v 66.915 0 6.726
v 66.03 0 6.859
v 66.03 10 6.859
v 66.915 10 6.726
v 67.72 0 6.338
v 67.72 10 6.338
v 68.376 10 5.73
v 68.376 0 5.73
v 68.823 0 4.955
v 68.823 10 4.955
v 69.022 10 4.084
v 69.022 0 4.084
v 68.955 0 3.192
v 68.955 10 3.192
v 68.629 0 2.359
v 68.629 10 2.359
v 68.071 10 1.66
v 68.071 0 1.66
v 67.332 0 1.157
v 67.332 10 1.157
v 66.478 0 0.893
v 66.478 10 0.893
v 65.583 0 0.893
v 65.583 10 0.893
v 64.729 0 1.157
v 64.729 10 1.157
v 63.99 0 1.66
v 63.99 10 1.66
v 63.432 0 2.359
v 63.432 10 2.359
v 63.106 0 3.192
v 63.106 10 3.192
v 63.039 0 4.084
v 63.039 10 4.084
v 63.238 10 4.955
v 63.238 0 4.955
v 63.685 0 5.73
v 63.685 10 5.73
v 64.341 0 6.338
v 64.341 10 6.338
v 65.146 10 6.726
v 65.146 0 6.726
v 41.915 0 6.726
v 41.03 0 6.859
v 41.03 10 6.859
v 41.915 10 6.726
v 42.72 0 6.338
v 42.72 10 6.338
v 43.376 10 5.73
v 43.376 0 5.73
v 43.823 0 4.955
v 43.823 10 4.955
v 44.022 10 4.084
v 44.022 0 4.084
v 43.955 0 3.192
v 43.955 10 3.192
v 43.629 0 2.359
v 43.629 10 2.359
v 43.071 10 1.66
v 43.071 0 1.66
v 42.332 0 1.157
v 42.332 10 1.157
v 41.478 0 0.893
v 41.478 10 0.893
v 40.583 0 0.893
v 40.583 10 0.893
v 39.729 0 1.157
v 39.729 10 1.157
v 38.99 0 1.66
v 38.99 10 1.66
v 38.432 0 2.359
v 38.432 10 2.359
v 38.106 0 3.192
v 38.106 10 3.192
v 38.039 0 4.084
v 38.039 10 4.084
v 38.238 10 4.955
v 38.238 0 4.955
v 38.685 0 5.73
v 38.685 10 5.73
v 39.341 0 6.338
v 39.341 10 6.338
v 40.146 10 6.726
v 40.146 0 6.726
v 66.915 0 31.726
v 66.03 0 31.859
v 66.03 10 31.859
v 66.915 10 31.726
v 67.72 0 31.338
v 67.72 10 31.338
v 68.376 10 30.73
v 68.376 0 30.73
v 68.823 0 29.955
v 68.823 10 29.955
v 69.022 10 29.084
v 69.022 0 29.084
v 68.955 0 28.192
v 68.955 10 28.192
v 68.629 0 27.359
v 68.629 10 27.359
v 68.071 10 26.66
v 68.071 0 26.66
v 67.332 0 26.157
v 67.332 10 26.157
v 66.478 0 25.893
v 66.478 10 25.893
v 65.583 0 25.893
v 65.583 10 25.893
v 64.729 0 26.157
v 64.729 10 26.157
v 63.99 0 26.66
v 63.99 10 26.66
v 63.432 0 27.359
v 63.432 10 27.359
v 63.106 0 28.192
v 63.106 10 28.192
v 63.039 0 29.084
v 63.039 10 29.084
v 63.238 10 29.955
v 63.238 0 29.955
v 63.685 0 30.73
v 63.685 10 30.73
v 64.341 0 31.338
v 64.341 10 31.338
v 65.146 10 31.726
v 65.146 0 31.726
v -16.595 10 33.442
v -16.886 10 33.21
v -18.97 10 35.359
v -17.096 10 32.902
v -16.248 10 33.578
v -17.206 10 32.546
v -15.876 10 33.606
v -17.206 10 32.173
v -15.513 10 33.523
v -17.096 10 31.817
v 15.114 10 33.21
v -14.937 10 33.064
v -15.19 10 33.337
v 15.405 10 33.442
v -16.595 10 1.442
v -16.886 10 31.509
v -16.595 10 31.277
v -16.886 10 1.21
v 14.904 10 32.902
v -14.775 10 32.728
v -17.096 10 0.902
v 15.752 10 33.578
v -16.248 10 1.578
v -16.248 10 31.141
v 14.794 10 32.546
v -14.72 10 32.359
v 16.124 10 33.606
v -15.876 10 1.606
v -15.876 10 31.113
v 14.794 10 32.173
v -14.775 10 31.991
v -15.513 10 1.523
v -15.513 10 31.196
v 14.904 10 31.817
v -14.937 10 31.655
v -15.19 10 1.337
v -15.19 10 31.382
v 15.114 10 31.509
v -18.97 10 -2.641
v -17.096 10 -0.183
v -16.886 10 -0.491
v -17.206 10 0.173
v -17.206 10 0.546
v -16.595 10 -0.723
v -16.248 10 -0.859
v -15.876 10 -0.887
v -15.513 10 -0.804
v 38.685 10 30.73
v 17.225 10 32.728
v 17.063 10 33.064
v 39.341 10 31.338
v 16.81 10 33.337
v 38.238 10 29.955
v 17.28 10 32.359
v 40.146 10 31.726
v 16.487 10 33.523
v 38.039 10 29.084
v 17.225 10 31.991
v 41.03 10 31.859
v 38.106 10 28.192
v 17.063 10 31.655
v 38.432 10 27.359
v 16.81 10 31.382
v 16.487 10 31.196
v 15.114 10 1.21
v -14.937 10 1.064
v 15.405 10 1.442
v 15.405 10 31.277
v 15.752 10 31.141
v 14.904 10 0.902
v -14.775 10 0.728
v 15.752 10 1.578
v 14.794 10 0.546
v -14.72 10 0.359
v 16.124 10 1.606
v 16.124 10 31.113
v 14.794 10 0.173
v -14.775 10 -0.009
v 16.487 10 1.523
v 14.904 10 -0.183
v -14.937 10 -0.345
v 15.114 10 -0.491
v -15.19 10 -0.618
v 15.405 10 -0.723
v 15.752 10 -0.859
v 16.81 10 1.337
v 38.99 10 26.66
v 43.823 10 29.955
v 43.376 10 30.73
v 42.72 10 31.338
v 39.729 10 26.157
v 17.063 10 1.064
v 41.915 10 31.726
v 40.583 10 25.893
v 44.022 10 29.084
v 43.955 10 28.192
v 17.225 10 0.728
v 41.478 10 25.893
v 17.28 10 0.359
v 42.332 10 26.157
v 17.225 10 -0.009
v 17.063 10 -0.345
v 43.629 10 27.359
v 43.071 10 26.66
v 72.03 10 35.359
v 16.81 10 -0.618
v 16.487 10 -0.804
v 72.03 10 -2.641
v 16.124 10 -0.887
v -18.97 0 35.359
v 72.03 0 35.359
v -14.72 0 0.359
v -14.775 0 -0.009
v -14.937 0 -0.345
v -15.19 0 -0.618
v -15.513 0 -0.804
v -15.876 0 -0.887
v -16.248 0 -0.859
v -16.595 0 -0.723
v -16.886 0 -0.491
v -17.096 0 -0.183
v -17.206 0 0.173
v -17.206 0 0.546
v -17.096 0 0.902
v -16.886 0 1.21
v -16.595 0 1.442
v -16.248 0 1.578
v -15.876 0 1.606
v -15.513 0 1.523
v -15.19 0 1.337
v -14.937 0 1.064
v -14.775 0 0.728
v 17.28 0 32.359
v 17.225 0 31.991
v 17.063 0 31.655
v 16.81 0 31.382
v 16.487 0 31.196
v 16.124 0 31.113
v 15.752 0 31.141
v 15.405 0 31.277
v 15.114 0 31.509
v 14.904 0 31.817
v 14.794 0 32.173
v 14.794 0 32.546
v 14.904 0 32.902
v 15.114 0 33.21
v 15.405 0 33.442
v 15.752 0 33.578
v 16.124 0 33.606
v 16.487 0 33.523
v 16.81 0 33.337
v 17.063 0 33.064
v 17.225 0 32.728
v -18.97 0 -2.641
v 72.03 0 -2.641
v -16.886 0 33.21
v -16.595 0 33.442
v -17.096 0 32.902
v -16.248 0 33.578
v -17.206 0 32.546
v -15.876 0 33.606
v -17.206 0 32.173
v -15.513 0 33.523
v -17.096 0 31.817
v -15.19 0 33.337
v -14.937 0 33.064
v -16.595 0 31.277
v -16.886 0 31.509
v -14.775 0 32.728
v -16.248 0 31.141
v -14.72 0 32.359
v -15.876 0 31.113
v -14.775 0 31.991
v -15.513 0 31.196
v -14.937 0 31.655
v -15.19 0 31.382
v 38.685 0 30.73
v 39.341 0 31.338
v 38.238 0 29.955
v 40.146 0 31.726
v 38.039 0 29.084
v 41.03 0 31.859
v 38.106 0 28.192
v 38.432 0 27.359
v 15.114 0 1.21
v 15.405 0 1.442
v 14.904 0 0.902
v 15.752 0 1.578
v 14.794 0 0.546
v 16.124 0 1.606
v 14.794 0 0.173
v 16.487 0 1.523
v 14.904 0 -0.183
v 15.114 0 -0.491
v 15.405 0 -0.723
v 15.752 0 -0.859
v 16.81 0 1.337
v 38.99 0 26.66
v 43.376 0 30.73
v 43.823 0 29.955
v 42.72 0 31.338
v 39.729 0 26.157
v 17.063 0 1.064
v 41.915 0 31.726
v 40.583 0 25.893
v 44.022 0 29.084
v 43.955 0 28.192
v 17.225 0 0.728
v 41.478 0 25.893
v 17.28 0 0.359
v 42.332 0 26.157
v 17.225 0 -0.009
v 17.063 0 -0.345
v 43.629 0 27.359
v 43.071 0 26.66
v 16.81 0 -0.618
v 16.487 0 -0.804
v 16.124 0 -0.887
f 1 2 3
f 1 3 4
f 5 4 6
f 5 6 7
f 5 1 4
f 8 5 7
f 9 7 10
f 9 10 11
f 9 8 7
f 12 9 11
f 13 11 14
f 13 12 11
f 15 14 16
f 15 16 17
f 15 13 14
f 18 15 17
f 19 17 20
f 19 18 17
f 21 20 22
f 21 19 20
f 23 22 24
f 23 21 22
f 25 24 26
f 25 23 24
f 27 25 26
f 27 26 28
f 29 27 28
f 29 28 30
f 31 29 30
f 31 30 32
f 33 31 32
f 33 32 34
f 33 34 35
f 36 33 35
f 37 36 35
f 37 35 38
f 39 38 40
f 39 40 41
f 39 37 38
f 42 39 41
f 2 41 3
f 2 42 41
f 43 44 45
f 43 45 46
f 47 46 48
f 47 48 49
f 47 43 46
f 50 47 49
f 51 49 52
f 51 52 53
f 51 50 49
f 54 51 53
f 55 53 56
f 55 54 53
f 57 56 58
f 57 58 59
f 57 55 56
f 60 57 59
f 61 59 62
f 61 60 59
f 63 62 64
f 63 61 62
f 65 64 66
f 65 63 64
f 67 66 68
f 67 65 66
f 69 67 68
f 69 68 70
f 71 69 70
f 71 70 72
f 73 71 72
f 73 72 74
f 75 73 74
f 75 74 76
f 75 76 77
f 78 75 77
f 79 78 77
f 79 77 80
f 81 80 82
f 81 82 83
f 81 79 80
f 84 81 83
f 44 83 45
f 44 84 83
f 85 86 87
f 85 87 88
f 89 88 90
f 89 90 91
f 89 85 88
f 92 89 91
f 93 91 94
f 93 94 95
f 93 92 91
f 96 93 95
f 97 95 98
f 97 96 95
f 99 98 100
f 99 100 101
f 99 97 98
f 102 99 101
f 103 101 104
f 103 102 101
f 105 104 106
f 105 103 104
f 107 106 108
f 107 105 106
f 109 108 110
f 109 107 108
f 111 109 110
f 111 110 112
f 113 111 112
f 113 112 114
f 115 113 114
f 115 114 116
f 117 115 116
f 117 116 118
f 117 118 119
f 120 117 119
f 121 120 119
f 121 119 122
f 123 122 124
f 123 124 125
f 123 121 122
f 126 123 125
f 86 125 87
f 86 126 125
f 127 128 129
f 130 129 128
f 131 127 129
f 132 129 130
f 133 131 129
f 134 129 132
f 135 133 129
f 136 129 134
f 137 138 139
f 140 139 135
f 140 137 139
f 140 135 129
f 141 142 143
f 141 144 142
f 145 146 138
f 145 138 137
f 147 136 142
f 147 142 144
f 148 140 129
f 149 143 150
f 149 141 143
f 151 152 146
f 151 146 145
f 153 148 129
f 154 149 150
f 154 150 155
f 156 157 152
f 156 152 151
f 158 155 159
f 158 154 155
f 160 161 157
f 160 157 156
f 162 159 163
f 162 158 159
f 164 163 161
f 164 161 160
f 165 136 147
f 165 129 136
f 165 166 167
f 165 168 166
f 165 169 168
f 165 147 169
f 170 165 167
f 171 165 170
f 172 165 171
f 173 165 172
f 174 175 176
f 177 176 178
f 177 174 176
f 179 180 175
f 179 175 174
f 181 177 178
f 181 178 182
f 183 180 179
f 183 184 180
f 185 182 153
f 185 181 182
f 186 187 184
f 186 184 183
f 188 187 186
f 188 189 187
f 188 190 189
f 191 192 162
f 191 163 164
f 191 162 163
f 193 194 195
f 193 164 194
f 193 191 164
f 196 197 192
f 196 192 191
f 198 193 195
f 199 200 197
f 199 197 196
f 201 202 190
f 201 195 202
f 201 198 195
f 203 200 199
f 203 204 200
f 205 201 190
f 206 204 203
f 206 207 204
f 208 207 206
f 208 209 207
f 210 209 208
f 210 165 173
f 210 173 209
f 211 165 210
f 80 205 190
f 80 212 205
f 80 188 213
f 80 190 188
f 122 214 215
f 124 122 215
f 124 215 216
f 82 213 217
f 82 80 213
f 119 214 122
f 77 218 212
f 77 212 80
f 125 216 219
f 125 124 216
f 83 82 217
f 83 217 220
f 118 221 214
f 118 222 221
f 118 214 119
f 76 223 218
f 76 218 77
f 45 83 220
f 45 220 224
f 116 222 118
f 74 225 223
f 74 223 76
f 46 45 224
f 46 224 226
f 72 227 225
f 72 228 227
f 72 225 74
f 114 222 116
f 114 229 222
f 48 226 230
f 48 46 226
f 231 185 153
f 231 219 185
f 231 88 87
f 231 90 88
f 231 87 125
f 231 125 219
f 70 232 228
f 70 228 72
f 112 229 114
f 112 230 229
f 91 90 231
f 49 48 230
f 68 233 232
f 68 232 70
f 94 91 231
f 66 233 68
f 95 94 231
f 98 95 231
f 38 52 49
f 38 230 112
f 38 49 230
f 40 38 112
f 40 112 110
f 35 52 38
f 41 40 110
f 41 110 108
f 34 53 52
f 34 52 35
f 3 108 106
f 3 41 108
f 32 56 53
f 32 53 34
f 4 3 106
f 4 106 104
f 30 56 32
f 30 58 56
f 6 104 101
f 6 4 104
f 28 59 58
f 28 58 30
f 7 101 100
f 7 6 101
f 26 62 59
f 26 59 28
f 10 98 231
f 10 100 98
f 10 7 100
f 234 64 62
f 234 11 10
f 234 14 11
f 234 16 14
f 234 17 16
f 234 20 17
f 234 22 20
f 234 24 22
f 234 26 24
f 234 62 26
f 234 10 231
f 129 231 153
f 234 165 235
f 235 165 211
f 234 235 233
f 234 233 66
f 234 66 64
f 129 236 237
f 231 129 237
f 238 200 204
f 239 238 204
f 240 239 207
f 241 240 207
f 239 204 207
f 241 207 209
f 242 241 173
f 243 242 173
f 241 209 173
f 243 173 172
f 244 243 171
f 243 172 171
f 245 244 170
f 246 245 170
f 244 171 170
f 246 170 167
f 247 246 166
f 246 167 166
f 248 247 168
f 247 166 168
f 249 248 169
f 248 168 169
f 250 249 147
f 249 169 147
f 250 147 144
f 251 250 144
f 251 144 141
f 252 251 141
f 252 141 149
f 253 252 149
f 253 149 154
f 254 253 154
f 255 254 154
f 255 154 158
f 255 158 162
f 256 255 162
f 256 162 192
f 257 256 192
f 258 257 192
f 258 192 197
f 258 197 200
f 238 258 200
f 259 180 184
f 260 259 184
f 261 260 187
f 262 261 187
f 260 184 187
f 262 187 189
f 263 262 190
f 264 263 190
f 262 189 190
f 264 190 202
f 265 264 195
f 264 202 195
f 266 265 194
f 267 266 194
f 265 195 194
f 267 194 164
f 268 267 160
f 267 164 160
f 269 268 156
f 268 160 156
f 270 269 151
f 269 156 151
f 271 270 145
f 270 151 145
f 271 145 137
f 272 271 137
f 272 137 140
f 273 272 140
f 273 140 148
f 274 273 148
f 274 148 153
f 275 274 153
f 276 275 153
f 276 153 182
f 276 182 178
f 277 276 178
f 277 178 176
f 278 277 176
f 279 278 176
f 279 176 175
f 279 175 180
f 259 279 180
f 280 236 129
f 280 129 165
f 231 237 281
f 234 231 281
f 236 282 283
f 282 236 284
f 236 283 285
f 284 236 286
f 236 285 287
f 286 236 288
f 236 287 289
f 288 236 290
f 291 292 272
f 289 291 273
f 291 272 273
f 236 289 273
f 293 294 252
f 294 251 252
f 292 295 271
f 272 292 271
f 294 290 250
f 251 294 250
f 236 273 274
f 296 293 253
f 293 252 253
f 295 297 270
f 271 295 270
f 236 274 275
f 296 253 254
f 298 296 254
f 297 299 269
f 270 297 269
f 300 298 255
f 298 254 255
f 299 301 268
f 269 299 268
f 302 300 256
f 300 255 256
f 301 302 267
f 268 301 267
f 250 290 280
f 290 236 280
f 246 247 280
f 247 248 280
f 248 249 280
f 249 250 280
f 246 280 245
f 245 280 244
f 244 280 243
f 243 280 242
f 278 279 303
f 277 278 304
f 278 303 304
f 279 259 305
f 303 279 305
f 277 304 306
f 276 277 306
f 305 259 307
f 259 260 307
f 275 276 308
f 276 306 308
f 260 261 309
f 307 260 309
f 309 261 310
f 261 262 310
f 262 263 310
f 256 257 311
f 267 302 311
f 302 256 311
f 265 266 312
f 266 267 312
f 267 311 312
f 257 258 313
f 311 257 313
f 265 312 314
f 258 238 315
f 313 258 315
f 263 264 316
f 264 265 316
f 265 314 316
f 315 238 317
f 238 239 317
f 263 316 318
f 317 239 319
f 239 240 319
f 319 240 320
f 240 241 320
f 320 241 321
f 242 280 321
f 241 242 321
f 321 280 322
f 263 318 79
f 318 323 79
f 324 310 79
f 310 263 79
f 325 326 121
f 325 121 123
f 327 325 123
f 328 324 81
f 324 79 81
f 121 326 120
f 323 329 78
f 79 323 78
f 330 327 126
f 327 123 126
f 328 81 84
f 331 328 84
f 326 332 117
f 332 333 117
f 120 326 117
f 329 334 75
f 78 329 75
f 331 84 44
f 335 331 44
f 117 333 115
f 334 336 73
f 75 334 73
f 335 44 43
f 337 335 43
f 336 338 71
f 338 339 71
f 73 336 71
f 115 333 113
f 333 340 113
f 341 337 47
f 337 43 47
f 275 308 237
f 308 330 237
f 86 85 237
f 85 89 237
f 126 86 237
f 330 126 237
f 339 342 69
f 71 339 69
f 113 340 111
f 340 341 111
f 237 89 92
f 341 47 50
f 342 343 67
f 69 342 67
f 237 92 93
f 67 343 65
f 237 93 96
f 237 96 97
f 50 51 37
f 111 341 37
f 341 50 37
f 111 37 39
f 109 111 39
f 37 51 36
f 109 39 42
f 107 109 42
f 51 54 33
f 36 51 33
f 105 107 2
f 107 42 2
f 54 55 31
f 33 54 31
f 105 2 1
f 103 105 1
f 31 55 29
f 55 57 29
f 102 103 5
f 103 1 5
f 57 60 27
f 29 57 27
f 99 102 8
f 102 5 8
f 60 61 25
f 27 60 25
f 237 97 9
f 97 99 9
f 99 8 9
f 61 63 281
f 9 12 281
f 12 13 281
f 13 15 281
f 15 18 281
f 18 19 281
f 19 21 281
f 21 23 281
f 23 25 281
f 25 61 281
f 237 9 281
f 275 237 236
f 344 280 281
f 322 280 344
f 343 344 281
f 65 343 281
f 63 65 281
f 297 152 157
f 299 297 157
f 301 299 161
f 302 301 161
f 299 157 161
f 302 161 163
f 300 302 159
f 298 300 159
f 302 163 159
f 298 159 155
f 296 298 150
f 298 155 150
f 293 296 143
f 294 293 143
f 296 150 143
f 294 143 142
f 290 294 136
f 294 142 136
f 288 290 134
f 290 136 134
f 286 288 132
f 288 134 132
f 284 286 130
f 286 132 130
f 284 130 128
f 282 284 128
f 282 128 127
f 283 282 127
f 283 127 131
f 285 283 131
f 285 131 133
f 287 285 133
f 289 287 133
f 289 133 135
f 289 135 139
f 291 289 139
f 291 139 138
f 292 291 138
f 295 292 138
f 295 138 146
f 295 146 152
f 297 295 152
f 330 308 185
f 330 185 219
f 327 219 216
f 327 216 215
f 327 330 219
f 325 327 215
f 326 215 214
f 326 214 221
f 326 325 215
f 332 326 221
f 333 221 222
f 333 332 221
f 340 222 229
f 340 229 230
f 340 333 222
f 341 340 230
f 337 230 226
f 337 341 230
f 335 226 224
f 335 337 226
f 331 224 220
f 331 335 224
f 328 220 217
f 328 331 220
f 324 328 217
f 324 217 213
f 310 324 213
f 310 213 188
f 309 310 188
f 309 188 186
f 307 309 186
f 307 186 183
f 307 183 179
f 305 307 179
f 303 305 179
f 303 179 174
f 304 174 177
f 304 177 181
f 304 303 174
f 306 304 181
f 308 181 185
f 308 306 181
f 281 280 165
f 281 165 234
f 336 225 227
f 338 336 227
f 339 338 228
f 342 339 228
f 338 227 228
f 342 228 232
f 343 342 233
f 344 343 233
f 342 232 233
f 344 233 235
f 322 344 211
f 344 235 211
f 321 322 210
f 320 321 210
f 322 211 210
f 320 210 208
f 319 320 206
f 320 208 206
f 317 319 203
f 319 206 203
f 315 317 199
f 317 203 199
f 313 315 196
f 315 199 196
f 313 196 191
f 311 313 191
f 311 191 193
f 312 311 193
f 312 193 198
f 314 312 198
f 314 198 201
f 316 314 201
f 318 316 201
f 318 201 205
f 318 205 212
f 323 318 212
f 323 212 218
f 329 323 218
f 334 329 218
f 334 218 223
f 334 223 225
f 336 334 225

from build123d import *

# Parameters (mm, degrees)
SKETCH1_W             = 91
SKETCH1_H             = 38
SKETCH1_R             = 3
BOSS_EXTRUDE1_DEPTH   = 10
M3X0_5_TAPPED_HOLE1_D = 2.5


with BuildPart() as part:
    # Sketch1 → Boss-Extrude1 (new body)
    with BuildSketch(Plane(origin=(0, 0, 0), x_dir=(1, 0, 0), z_dir=(0, 1, 0))):
        with Locations((26.530497816, -16.359463259)):
            Rectangle(SKETCH1_W, SKETCH1_H)
        with Locations(Location((41.030497816, -28.859463259, 0), (0, 0, 270))):
            Circle(SKETCH1_R, mode=Mode.SUBTRACT)
        with Locations(Location((66.030497816, -28.859463259, 0), (0, 0, 270))):
            Circle(SKETCH1_R, mode=Mode.SUBTRACT)
        with Locations(Location((41.030497816, -3.859463259, 0), (0, 0, 270))):
            Circle(SKETCH1_R, mode=Mode.SUBTRACT)
        with Locations(Location((66.030497816, -3.859463259, 0), (0, 0, 270))):
            Circle(SKETCH1_R, mode=Mode.SUBTRACT)
    extrude(amount=BOSS_EXTRUDE1_DEPTH)

    # M3x0.5 Tapped Hole1 (through all)
    with Locations(Plane(origin=(0, 0, 0), x_dir=(-1, 0, 0), z_dir=(0, -1, 0))):
        with Locations((-16.030497816, -0.359463259), (15.969502184, -32.359463259), (-16.030497816, -32.359463259), (15.969502184, -0.359463259)):
            Hole(M3X0_5_TAPPED_HOLE1_D / 2)


solid = part.part
